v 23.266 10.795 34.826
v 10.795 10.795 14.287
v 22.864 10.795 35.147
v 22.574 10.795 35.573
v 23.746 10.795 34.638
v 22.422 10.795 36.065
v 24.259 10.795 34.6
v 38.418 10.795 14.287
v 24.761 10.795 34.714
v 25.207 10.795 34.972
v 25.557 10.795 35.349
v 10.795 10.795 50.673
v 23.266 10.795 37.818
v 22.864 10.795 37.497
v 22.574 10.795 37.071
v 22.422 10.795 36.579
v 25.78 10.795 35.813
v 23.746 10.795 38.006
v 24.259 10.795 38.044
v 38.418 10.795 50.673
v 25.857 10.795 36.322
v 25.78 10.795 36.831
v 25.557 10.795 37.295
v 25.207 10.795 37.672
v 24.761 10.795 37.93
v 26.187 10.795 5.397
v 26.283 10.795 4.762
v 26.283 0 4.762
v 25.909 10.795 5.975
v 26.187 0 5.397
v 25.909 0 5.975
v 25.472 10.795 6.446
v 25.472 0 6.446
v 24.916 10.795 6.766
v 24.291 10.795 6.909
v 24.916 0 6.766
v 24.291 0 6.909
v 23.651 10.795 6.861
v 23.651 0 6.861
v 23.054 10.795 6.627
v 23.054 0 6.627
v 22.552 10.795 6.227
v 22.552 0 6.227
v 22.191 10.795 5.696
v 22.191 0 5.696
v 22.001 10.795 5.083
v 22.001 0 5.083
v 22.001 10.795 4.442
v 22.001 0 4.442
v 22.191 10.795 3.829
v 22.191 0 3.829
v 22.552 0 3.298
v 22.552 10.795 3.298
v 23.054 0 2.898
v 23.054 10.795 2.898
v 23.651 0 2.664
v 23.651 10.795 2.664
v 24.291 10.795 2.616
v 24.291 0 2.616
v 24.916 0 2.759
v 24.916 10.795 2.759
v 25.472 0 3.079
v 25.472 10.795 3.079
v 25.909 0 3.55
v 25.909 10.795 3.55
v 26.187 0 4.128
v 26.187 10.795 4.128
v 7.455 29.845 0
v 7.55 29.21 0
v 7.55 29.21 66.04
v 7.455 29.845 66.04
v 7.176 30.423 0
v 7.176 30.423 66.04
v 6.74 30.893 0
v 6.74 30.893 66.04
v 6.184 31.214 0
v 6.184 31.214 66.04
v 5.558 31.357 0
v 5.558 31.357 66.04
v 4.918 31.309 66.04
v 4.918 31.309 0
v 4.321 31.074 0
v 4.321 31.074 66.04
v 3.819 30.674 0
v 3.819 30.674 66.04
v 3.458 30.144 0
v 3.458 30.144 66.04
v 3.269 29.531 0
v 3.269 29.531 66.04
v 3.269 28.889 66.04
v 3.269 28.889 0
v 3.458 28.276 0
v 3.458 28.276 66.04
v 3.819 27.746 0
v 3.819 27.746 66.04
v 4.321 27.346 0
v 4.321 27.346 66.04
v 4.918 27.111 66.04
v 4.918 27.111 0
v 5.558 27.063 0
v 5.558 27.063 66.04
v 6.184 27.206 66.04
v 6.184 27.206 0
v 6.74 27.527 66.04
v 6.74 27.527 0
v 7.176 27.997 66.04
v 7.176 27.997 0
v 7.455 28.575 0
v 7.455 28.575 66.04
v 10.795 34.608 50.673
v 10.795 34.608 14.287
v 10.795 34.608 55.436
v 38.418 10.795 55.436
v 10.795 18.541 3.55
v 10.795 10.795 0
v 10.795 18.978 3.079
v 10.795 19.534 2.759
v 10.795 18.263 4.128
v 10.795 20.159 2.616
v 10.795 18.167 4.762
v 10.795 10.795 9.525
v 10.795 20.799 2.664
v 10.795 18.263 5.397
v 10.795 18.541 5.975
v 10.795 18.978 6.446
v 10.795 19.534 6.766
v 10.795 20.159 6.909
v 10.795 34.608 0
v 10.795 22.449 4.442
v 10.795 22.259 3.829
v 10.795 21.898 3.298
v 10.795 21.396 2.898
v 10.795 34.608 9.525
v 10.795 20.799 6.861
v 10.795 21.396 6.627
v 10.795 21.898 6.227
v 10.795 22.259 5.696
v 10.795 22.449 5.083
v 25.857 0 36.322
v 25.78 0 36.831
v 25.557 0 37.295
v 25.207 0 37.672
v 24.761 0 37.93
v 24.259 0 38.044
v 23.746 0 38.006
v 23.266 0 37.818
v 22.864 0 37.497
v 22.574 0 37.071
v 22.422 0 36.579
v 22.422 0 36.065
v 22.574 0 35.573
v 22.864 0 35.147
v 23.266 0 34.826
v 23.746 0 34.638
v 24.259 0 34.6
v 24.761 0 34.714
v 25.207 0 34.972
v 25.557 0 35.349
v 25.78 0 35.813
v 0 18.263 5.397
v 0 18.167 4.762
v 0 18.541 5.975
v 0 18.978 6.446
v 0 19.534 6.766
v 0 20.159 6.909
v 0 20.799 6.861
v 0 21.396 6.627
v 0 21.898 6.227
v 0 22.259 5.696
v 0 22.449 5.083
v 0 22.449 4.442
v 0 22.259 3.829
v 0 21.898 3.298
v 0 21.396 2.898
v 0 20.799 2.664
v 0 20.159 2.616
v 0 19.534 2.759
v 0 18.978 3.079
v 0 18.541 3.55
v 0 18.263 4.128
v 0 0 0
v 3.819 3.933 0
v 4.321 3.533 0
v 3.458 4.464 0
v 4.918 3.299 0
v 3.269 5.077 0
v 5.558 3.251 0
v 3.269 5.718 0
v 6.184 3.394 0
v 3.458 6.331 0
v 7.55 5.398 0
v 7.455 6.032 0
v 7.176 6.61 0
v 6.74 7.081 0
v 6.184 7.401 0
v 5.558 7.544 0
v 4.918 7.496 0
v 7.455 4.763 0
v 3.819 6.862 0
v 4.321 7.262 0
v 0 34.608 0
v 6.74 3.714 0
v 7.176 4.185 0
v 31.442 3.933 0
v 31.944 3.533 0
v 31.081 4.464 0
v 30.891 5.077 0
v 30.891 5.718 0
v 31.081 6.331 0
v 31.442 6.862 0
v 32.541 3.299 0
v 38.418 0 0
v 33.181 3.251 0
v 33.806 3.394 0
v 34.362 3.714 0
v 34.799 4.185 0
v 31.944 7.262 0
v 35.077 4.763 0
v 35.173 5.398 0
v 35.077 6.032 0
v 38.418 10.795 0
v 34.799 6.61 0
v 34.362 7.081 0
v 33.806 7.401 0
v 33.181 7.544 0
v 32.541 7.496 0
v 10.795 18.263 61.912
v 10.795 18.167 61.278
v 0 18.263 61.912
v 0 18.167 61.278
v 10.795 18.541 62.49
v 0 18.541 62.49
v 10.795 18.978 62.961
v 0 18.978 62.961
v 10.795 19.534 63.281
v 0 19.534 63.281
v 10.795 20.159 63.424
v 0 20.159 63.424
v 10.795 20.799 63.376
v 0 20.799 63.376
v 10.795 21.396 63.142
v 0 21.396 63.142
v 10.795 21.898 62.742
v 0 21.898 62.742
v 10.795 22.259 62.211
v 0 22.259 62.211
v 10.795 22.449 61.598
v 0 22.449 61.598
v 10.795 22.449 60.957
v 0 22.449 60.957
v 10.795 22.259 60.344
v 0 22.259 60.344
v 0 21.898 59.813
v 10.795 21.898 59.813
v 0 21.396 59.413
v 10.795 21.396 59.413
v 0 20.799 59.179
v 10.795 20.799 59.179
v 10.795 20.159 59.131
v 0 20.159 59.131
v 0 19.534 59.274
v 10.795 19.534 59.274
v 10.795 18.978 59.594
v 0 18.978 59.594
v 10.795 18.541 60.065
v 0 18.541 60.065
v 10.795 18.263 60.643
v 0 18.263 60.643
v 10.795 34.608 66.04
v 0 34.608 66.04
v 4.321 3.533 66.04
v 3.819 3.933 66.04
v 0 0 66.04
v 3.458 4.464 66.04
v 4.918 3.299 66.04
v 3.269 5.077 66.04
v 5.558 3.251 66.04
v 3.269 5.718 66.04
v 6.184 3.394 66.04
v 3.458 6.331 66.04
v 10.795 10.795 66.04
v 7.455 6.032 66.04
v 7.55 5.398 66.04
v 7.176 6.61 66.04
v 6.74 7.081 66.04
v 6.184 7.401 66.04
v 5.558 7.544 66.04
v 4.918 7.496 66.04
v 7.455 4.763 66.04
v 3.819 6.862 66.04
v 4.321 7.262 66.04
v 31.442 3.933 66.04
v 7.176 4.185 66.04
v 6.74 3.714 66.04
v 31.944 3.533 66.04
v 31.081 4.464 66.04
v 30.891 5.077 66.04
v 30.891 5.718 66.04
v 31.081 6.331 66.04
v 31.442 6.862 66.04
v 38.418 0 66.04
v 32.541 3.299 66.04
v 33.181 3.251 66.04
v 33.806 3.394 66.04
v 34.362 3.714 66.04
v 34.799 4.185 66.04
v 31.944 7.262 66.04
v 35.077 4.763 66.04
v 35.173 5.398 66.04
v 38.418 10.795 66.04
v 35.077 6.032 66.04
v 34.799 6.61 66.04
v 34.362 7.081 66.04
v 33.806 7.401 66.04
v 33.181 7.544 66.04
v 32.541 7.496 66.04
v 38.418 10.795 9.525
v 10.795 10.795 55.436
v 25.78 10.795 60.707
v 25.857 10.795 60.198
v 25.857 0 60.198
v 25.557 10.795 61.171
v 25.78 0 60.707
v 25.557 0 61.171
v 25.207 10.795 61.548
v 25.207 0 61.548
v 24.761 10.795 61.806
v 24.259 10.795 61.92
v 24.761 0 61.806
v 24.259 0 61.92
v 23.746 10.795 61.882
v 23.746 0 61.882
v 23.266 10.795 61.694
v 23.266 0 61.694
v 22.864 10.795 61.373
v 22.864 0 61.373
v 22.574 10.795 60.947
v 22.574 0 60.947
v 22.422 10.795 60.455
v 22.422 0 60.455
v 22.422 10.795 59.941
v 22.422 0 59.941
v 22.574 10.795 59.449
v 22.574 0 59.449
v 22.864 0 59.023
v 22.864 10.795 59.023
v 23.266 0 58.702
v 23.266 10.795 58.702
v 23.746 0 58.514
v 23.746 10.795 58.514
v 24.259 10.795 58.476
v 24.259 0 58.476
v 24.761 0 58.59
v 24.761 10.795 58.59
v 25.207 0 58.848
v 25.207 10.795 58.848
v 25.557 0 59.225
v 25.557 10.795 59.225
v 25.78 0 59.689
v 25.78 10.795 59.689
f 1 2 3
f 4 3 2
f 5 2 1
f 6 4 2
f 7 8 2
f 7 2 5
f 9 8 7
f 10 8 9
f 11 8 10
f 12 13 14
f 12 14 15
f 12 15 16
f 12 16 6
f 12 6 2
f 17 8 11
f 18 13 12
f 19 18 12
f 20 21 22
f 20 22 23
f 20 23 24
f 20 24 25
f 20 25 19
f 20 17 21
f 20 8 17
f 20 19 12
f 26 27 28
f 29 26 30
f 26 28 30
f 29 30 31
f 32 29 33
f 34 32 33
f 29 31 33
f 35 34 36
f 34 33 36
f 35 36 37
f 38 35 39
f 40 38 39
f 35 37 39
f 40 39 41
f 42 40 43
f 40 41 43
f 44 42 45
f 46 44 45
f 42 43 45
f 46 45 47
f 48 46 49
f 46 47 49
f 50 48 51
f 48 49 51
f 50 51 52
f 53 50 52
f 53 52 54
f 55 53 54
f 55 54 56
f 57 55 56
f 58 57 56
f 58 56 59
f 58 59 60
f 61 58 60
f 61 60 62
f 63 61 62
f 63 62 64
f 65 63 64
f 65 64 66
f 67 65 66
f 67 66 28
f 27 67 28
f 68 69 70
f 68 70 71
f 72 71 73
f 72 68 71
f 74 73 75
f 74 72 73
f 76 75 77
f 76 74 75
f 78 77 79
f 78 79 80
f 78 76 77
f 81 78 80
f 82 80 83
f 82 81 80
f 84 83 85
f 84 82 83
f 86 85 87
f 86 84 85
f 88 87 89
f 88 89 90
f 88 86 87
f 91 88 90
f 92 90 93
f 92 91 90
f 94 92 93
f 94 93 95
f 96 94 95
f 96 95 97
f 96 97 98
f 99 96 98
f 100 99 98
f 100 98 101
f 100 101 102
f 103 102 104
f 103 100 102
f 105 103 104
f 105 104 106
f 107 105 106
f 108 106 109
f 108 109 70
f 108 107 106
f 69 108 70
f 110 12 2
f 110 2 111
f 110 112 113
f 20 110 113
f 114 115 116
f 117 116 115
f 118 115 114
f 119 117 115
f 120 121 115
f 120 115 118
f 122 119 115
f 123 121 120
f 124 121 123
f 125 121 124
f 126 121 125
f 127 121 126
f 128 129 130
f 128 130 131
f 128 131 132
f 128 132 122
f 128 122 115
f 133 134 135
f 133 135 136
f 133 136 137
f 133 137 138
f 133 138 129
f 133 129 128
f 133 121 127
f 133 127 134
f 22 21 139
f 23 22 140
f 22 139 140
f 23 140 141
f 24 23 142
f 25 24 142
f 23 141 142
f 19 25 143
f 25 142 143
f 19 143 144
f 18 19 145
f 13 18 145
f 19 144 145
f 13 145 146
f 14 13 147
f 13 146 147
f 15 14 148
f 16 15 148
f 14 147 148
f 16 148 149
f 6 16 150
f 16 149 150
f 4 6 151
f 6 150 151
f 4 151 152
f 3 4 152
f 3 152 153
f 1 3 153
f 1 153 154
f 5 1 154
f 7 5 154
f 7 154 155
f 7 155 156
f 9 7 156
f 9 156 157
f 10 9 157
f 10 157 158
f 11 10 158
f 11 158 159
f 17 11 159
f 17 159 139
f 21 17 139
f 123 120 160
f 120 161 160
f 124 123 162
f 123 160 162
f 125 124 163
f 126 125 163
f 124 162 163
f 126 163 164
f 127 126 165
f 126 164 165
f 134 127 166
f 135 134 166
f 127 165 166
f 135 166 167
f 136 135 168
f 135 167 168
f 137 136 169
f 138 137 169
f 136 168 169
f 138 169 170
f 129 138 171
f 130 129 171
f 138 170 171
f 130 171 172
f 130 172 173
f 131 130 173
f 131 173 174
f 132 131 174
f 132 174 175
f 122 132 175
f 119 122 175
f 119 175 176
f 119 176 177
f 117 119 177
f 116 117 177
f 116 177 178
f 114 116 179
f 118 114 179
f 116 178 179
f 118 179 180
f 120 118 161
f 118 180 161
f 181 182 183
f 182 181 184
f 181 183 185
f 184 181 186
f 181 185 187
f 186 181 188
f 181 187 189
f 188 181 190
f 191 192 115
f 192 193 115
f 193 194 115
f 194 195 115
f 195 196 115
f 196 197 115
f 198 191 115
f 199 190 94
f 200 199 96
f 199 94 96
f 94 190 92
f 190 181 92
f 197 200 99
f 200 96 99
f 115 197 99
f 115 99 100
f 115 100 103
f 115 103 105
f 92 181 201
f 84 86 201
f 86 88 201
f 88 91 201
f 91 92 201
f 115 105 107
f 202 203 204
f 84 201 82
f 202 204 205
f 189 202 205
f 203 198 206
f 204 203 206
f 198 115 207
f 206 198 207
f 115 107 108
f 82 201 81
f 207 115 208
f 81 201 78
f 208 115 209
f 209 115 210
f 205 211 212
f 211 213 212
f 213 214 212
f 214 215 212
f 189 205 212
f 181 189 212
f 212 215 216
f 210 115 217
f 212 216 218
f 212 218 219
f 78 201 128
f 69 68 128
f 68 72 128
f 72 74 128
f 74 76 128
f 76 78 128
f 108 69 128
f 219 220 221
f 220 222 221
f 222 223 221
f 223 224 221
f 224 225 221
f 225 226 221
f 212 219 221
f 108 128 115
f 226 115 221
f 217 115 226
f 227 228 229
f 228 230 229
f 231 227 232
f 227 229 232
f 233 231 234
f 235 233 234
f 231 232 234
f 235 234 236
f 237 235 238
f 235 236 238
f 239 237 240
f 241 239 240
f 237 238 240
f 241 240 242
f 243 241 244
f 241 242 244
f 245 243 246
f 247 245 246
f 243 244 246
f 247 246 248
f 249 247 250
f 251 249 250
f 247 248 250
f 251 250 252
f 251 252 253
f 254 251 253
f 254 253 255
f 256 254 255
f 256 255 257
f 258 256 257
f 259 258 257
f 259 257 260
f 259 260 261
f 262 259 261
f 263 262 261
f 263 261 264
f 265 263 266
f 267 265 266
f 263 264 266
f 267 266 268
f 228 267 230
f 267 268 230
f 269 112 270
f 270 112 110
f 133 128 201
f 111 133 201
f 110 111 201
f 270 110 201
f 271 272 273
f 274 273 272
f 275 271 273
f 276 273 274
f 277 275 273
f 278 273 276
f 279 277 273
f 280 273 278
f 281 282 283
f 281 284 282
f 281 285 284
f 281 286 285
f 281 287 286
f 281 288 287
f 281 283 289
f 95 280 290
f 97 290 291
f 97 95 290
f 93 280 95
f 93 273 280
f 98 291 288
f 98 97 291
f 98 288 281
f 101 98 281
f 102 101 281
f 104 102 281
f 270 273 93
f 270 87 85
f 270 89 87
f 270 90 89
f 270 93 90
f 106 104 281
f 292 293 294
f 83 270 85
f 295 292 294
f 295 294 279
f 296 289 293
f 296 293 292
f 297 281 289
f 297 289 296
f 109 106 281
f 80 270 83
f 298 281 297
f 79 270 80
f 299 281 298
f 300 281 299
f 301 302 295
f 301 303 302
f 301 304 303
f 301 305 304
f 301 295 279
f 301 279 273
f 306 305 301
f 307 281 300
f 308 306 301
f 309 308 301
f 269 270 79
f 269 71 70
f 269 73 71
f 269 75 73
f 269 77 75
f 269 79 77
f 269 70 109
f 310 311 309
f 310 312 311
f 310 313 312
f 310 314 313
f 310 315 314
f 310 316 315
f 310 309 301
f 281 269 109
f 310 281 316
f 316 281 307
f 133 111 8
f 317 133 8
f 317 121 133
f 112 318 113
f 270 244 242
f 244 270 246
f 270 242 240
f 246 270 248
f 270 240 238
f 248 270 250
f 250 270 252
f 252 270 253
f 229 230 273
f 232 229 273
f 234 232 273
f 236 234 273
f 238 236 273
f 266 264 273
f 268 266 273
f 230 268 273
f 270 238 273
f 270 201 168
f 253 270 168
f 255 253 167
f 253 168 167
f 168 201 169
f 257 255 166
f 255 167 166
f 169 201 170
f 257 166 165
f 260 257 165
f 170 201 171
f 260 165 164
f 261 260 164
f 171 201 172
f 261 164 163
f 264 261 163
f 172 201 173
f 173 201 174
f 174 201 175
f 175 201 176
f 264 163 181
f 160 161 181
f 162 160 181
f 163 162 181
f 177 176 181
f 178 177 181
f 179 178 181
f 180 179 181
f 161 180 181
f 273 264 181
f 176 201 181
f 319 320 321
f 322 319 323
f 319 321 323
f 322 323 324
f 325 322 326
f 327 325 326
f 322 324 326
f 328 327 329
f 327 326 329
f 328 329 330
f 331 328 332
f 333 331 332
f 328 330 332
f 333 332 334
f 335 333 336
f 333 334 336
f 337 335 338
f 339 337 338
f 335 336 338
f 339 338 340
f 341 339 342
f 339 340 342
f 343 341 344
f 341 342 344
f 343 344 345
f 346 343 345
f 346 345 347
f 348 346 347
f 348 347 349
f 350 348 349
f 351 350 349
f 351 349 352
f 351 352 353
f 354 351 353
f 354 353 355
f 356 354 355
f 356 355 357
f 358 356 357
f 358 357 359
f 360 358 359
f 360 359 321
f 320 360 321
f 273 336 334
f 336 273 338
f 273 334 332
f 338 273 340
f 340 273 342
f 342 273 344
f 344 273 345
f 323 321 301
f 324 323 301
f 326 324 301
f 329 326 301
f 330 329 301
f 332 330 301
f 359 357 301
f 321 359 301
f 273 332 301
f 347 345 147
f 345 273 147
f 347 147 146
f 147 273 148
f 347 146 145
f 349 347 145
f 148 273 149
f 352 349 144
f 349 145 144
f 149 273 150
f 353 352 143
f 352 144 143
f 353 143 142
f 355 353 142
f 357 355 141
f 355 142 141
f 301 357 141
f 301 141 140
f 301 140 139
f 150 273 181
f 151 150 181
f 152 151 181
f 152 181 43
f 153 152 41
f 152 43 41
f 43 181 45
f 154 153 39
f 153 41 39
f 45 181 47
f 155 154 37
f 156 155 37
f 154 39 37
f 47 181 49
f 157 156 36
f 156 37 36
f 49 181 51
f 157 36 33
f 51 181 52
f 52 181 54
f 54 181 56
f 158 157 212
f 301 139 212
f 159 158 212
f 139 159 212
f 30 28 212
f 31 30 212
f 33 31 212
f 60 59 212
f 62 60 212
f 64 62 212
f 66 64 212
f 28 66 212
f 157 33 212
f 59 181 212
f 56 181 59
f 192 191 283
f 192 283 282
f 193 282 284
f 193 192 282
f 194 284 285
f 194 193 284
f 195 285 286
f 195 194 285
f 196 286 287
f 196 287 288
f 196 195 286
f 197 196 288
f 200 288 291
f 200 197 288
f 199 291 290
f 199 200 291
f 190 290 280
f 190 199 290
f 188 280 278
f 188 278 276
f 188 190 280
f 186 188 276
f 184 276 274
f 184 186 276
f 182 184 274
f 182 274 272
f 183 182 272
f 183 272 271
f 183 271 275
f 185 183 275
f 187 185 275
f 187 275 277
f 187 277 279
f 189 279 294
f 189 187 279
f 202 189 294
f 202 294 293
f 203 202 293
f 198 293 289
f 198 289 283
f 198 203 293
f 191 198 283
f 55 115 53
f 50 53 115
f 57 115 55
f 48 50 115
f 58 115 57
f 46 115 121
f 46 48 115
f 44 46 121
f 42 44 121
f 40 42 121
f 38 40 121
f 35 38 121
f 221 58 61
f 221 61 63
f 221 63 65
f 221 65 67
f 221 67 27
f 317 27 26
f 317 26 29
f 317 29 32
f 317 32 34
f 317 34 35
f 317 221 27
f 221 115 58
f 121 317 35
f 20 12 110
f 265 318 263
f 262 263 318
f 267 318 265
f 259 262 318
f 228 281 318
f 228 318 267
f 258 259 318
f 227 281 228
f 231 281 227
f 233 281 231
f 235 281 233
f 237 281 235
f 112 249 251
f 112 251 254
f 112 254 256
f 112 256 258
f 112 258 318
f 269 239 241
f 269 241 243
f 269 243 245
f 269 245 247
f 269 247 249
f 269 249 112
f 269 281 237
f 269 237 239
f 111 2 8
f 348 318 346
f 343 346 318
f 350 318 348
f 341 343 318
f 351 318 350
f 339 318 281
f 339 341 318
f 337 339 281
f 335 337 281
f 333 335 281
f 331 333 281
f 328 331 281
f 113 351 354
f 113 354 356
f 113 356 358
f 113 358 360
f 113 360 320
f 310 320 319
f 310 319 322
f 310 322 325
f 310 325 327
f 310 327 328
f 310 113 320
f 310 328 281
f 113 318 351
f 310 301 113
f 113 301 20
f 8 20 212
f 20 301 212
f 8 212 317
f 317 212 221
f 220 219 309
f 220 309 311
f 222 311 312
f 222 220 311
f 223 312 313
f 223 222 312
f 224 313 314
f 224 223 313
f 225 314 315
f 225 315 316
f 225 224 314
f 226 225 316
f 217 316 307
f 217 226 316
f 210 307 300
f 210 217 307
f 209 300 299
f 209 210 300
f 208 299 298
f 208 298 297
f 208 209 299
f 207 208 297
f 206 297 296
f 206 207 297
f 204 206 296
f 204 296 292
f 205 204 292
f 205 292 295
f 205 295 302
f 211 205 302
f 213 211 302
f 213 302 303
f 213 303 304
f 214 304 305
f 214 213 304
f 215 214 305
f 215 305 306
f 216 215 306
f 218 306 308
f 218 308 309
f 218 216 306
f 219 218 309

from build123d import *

# Parameters (mm, degrees)
F0_R      = 2.15265
F1_DEPTH  = 66.04
F2_R      = 1.7272
F2_R_2    = 2.15265
F3_DEPTH  = 34.6075
F4_R      = 2.15265
F5_DEPTH  = 38.4175
F7_DEPTH  = 66.04
F9_W      = 23.8125
F9_H      = 9.525
F9_H_2    = 36.3855
F9_H_3    = 10.6045
F10_DEPTH = 27.6225


with BuildPart() as f1:
    # F0 (on Top) → F1 (new body)
    with BuildSketch(Plane.XY):
        Polygon((0, 34.6075), (0, 0), (38.4175, 0), (38.4175, 10.795), (38.4175, 34.6075), (10.795, 34.6075), align=None)
        with Locations((5.3975, 5.3975)):
            Circle(F0_R, mode=Mode.SUBTRACT)
        with Locations((33.02, 5.3975)):
            Circle(F0_R, mode=Mode.SUBTRACT)
        with Locations((5.3975, 29.21)):
            Circle(F0_R, mode=Mode.SUBTRACT)
    extrude(amount=F1_DEPTH)

    # F2 (on face) → F3 (cut, through all)
    with BuildSketch(Plane.XZ):
        with Locations((24.13, 60.198)):
            Circle(F2_R)
        with Locations((24.13, 36.322)):
            Circle(F2_R)
        with Locations((24.13, 4.7625)):
            Circle(F2_R_2)
    extrude(amount=-F3_DEPTH, mode=Mode.SUBTRACT)

    # F4 (on face) → F5 (cut, through all)
    with BuildSketch(Plane(origin=(0, 0, 0), x_dir=(0, -1, 0), z_dir=(-1, 0, 0))):
        with Locations((-20.32, 61.2775)):
            Circle(F4_R)
        with Locations((-20.32, 4.7625)):
            Circle(F4_R)
    extrude(amount=-F5_DEPTH, mode=Mode.SUBTRACT)

    # F6 (on face) → F7 (cut, through all)
    with BuildSketch(Plane.XY.offset(66.04)):
        Polygon((38.4175, 10.795), (38.4175, 34.6075), (10.795, 34.6075), align=None)
    extrude(amount=-F7_DEPTH, mode=Mode.SUBTRACT)

    # F9 (on face) → F10 (cut, through all)
    with BuildSketch(Plane.YZ.offset(38.4175)):
        with Locations((22.70125, 4.7625)):
            Rectangle(F9_W, F9_H)
        with Locations((22.70125, 32.48025)):
            Rectangle(F9_W, F9_H_2)
        with Locations((22.70125, 60.73775)):
            Rectangle(F9_W, F9_H_3)
    extrude(amount=-F10_DEPTH, mode=Mode.SUBTRACT)


solid = f1.part
